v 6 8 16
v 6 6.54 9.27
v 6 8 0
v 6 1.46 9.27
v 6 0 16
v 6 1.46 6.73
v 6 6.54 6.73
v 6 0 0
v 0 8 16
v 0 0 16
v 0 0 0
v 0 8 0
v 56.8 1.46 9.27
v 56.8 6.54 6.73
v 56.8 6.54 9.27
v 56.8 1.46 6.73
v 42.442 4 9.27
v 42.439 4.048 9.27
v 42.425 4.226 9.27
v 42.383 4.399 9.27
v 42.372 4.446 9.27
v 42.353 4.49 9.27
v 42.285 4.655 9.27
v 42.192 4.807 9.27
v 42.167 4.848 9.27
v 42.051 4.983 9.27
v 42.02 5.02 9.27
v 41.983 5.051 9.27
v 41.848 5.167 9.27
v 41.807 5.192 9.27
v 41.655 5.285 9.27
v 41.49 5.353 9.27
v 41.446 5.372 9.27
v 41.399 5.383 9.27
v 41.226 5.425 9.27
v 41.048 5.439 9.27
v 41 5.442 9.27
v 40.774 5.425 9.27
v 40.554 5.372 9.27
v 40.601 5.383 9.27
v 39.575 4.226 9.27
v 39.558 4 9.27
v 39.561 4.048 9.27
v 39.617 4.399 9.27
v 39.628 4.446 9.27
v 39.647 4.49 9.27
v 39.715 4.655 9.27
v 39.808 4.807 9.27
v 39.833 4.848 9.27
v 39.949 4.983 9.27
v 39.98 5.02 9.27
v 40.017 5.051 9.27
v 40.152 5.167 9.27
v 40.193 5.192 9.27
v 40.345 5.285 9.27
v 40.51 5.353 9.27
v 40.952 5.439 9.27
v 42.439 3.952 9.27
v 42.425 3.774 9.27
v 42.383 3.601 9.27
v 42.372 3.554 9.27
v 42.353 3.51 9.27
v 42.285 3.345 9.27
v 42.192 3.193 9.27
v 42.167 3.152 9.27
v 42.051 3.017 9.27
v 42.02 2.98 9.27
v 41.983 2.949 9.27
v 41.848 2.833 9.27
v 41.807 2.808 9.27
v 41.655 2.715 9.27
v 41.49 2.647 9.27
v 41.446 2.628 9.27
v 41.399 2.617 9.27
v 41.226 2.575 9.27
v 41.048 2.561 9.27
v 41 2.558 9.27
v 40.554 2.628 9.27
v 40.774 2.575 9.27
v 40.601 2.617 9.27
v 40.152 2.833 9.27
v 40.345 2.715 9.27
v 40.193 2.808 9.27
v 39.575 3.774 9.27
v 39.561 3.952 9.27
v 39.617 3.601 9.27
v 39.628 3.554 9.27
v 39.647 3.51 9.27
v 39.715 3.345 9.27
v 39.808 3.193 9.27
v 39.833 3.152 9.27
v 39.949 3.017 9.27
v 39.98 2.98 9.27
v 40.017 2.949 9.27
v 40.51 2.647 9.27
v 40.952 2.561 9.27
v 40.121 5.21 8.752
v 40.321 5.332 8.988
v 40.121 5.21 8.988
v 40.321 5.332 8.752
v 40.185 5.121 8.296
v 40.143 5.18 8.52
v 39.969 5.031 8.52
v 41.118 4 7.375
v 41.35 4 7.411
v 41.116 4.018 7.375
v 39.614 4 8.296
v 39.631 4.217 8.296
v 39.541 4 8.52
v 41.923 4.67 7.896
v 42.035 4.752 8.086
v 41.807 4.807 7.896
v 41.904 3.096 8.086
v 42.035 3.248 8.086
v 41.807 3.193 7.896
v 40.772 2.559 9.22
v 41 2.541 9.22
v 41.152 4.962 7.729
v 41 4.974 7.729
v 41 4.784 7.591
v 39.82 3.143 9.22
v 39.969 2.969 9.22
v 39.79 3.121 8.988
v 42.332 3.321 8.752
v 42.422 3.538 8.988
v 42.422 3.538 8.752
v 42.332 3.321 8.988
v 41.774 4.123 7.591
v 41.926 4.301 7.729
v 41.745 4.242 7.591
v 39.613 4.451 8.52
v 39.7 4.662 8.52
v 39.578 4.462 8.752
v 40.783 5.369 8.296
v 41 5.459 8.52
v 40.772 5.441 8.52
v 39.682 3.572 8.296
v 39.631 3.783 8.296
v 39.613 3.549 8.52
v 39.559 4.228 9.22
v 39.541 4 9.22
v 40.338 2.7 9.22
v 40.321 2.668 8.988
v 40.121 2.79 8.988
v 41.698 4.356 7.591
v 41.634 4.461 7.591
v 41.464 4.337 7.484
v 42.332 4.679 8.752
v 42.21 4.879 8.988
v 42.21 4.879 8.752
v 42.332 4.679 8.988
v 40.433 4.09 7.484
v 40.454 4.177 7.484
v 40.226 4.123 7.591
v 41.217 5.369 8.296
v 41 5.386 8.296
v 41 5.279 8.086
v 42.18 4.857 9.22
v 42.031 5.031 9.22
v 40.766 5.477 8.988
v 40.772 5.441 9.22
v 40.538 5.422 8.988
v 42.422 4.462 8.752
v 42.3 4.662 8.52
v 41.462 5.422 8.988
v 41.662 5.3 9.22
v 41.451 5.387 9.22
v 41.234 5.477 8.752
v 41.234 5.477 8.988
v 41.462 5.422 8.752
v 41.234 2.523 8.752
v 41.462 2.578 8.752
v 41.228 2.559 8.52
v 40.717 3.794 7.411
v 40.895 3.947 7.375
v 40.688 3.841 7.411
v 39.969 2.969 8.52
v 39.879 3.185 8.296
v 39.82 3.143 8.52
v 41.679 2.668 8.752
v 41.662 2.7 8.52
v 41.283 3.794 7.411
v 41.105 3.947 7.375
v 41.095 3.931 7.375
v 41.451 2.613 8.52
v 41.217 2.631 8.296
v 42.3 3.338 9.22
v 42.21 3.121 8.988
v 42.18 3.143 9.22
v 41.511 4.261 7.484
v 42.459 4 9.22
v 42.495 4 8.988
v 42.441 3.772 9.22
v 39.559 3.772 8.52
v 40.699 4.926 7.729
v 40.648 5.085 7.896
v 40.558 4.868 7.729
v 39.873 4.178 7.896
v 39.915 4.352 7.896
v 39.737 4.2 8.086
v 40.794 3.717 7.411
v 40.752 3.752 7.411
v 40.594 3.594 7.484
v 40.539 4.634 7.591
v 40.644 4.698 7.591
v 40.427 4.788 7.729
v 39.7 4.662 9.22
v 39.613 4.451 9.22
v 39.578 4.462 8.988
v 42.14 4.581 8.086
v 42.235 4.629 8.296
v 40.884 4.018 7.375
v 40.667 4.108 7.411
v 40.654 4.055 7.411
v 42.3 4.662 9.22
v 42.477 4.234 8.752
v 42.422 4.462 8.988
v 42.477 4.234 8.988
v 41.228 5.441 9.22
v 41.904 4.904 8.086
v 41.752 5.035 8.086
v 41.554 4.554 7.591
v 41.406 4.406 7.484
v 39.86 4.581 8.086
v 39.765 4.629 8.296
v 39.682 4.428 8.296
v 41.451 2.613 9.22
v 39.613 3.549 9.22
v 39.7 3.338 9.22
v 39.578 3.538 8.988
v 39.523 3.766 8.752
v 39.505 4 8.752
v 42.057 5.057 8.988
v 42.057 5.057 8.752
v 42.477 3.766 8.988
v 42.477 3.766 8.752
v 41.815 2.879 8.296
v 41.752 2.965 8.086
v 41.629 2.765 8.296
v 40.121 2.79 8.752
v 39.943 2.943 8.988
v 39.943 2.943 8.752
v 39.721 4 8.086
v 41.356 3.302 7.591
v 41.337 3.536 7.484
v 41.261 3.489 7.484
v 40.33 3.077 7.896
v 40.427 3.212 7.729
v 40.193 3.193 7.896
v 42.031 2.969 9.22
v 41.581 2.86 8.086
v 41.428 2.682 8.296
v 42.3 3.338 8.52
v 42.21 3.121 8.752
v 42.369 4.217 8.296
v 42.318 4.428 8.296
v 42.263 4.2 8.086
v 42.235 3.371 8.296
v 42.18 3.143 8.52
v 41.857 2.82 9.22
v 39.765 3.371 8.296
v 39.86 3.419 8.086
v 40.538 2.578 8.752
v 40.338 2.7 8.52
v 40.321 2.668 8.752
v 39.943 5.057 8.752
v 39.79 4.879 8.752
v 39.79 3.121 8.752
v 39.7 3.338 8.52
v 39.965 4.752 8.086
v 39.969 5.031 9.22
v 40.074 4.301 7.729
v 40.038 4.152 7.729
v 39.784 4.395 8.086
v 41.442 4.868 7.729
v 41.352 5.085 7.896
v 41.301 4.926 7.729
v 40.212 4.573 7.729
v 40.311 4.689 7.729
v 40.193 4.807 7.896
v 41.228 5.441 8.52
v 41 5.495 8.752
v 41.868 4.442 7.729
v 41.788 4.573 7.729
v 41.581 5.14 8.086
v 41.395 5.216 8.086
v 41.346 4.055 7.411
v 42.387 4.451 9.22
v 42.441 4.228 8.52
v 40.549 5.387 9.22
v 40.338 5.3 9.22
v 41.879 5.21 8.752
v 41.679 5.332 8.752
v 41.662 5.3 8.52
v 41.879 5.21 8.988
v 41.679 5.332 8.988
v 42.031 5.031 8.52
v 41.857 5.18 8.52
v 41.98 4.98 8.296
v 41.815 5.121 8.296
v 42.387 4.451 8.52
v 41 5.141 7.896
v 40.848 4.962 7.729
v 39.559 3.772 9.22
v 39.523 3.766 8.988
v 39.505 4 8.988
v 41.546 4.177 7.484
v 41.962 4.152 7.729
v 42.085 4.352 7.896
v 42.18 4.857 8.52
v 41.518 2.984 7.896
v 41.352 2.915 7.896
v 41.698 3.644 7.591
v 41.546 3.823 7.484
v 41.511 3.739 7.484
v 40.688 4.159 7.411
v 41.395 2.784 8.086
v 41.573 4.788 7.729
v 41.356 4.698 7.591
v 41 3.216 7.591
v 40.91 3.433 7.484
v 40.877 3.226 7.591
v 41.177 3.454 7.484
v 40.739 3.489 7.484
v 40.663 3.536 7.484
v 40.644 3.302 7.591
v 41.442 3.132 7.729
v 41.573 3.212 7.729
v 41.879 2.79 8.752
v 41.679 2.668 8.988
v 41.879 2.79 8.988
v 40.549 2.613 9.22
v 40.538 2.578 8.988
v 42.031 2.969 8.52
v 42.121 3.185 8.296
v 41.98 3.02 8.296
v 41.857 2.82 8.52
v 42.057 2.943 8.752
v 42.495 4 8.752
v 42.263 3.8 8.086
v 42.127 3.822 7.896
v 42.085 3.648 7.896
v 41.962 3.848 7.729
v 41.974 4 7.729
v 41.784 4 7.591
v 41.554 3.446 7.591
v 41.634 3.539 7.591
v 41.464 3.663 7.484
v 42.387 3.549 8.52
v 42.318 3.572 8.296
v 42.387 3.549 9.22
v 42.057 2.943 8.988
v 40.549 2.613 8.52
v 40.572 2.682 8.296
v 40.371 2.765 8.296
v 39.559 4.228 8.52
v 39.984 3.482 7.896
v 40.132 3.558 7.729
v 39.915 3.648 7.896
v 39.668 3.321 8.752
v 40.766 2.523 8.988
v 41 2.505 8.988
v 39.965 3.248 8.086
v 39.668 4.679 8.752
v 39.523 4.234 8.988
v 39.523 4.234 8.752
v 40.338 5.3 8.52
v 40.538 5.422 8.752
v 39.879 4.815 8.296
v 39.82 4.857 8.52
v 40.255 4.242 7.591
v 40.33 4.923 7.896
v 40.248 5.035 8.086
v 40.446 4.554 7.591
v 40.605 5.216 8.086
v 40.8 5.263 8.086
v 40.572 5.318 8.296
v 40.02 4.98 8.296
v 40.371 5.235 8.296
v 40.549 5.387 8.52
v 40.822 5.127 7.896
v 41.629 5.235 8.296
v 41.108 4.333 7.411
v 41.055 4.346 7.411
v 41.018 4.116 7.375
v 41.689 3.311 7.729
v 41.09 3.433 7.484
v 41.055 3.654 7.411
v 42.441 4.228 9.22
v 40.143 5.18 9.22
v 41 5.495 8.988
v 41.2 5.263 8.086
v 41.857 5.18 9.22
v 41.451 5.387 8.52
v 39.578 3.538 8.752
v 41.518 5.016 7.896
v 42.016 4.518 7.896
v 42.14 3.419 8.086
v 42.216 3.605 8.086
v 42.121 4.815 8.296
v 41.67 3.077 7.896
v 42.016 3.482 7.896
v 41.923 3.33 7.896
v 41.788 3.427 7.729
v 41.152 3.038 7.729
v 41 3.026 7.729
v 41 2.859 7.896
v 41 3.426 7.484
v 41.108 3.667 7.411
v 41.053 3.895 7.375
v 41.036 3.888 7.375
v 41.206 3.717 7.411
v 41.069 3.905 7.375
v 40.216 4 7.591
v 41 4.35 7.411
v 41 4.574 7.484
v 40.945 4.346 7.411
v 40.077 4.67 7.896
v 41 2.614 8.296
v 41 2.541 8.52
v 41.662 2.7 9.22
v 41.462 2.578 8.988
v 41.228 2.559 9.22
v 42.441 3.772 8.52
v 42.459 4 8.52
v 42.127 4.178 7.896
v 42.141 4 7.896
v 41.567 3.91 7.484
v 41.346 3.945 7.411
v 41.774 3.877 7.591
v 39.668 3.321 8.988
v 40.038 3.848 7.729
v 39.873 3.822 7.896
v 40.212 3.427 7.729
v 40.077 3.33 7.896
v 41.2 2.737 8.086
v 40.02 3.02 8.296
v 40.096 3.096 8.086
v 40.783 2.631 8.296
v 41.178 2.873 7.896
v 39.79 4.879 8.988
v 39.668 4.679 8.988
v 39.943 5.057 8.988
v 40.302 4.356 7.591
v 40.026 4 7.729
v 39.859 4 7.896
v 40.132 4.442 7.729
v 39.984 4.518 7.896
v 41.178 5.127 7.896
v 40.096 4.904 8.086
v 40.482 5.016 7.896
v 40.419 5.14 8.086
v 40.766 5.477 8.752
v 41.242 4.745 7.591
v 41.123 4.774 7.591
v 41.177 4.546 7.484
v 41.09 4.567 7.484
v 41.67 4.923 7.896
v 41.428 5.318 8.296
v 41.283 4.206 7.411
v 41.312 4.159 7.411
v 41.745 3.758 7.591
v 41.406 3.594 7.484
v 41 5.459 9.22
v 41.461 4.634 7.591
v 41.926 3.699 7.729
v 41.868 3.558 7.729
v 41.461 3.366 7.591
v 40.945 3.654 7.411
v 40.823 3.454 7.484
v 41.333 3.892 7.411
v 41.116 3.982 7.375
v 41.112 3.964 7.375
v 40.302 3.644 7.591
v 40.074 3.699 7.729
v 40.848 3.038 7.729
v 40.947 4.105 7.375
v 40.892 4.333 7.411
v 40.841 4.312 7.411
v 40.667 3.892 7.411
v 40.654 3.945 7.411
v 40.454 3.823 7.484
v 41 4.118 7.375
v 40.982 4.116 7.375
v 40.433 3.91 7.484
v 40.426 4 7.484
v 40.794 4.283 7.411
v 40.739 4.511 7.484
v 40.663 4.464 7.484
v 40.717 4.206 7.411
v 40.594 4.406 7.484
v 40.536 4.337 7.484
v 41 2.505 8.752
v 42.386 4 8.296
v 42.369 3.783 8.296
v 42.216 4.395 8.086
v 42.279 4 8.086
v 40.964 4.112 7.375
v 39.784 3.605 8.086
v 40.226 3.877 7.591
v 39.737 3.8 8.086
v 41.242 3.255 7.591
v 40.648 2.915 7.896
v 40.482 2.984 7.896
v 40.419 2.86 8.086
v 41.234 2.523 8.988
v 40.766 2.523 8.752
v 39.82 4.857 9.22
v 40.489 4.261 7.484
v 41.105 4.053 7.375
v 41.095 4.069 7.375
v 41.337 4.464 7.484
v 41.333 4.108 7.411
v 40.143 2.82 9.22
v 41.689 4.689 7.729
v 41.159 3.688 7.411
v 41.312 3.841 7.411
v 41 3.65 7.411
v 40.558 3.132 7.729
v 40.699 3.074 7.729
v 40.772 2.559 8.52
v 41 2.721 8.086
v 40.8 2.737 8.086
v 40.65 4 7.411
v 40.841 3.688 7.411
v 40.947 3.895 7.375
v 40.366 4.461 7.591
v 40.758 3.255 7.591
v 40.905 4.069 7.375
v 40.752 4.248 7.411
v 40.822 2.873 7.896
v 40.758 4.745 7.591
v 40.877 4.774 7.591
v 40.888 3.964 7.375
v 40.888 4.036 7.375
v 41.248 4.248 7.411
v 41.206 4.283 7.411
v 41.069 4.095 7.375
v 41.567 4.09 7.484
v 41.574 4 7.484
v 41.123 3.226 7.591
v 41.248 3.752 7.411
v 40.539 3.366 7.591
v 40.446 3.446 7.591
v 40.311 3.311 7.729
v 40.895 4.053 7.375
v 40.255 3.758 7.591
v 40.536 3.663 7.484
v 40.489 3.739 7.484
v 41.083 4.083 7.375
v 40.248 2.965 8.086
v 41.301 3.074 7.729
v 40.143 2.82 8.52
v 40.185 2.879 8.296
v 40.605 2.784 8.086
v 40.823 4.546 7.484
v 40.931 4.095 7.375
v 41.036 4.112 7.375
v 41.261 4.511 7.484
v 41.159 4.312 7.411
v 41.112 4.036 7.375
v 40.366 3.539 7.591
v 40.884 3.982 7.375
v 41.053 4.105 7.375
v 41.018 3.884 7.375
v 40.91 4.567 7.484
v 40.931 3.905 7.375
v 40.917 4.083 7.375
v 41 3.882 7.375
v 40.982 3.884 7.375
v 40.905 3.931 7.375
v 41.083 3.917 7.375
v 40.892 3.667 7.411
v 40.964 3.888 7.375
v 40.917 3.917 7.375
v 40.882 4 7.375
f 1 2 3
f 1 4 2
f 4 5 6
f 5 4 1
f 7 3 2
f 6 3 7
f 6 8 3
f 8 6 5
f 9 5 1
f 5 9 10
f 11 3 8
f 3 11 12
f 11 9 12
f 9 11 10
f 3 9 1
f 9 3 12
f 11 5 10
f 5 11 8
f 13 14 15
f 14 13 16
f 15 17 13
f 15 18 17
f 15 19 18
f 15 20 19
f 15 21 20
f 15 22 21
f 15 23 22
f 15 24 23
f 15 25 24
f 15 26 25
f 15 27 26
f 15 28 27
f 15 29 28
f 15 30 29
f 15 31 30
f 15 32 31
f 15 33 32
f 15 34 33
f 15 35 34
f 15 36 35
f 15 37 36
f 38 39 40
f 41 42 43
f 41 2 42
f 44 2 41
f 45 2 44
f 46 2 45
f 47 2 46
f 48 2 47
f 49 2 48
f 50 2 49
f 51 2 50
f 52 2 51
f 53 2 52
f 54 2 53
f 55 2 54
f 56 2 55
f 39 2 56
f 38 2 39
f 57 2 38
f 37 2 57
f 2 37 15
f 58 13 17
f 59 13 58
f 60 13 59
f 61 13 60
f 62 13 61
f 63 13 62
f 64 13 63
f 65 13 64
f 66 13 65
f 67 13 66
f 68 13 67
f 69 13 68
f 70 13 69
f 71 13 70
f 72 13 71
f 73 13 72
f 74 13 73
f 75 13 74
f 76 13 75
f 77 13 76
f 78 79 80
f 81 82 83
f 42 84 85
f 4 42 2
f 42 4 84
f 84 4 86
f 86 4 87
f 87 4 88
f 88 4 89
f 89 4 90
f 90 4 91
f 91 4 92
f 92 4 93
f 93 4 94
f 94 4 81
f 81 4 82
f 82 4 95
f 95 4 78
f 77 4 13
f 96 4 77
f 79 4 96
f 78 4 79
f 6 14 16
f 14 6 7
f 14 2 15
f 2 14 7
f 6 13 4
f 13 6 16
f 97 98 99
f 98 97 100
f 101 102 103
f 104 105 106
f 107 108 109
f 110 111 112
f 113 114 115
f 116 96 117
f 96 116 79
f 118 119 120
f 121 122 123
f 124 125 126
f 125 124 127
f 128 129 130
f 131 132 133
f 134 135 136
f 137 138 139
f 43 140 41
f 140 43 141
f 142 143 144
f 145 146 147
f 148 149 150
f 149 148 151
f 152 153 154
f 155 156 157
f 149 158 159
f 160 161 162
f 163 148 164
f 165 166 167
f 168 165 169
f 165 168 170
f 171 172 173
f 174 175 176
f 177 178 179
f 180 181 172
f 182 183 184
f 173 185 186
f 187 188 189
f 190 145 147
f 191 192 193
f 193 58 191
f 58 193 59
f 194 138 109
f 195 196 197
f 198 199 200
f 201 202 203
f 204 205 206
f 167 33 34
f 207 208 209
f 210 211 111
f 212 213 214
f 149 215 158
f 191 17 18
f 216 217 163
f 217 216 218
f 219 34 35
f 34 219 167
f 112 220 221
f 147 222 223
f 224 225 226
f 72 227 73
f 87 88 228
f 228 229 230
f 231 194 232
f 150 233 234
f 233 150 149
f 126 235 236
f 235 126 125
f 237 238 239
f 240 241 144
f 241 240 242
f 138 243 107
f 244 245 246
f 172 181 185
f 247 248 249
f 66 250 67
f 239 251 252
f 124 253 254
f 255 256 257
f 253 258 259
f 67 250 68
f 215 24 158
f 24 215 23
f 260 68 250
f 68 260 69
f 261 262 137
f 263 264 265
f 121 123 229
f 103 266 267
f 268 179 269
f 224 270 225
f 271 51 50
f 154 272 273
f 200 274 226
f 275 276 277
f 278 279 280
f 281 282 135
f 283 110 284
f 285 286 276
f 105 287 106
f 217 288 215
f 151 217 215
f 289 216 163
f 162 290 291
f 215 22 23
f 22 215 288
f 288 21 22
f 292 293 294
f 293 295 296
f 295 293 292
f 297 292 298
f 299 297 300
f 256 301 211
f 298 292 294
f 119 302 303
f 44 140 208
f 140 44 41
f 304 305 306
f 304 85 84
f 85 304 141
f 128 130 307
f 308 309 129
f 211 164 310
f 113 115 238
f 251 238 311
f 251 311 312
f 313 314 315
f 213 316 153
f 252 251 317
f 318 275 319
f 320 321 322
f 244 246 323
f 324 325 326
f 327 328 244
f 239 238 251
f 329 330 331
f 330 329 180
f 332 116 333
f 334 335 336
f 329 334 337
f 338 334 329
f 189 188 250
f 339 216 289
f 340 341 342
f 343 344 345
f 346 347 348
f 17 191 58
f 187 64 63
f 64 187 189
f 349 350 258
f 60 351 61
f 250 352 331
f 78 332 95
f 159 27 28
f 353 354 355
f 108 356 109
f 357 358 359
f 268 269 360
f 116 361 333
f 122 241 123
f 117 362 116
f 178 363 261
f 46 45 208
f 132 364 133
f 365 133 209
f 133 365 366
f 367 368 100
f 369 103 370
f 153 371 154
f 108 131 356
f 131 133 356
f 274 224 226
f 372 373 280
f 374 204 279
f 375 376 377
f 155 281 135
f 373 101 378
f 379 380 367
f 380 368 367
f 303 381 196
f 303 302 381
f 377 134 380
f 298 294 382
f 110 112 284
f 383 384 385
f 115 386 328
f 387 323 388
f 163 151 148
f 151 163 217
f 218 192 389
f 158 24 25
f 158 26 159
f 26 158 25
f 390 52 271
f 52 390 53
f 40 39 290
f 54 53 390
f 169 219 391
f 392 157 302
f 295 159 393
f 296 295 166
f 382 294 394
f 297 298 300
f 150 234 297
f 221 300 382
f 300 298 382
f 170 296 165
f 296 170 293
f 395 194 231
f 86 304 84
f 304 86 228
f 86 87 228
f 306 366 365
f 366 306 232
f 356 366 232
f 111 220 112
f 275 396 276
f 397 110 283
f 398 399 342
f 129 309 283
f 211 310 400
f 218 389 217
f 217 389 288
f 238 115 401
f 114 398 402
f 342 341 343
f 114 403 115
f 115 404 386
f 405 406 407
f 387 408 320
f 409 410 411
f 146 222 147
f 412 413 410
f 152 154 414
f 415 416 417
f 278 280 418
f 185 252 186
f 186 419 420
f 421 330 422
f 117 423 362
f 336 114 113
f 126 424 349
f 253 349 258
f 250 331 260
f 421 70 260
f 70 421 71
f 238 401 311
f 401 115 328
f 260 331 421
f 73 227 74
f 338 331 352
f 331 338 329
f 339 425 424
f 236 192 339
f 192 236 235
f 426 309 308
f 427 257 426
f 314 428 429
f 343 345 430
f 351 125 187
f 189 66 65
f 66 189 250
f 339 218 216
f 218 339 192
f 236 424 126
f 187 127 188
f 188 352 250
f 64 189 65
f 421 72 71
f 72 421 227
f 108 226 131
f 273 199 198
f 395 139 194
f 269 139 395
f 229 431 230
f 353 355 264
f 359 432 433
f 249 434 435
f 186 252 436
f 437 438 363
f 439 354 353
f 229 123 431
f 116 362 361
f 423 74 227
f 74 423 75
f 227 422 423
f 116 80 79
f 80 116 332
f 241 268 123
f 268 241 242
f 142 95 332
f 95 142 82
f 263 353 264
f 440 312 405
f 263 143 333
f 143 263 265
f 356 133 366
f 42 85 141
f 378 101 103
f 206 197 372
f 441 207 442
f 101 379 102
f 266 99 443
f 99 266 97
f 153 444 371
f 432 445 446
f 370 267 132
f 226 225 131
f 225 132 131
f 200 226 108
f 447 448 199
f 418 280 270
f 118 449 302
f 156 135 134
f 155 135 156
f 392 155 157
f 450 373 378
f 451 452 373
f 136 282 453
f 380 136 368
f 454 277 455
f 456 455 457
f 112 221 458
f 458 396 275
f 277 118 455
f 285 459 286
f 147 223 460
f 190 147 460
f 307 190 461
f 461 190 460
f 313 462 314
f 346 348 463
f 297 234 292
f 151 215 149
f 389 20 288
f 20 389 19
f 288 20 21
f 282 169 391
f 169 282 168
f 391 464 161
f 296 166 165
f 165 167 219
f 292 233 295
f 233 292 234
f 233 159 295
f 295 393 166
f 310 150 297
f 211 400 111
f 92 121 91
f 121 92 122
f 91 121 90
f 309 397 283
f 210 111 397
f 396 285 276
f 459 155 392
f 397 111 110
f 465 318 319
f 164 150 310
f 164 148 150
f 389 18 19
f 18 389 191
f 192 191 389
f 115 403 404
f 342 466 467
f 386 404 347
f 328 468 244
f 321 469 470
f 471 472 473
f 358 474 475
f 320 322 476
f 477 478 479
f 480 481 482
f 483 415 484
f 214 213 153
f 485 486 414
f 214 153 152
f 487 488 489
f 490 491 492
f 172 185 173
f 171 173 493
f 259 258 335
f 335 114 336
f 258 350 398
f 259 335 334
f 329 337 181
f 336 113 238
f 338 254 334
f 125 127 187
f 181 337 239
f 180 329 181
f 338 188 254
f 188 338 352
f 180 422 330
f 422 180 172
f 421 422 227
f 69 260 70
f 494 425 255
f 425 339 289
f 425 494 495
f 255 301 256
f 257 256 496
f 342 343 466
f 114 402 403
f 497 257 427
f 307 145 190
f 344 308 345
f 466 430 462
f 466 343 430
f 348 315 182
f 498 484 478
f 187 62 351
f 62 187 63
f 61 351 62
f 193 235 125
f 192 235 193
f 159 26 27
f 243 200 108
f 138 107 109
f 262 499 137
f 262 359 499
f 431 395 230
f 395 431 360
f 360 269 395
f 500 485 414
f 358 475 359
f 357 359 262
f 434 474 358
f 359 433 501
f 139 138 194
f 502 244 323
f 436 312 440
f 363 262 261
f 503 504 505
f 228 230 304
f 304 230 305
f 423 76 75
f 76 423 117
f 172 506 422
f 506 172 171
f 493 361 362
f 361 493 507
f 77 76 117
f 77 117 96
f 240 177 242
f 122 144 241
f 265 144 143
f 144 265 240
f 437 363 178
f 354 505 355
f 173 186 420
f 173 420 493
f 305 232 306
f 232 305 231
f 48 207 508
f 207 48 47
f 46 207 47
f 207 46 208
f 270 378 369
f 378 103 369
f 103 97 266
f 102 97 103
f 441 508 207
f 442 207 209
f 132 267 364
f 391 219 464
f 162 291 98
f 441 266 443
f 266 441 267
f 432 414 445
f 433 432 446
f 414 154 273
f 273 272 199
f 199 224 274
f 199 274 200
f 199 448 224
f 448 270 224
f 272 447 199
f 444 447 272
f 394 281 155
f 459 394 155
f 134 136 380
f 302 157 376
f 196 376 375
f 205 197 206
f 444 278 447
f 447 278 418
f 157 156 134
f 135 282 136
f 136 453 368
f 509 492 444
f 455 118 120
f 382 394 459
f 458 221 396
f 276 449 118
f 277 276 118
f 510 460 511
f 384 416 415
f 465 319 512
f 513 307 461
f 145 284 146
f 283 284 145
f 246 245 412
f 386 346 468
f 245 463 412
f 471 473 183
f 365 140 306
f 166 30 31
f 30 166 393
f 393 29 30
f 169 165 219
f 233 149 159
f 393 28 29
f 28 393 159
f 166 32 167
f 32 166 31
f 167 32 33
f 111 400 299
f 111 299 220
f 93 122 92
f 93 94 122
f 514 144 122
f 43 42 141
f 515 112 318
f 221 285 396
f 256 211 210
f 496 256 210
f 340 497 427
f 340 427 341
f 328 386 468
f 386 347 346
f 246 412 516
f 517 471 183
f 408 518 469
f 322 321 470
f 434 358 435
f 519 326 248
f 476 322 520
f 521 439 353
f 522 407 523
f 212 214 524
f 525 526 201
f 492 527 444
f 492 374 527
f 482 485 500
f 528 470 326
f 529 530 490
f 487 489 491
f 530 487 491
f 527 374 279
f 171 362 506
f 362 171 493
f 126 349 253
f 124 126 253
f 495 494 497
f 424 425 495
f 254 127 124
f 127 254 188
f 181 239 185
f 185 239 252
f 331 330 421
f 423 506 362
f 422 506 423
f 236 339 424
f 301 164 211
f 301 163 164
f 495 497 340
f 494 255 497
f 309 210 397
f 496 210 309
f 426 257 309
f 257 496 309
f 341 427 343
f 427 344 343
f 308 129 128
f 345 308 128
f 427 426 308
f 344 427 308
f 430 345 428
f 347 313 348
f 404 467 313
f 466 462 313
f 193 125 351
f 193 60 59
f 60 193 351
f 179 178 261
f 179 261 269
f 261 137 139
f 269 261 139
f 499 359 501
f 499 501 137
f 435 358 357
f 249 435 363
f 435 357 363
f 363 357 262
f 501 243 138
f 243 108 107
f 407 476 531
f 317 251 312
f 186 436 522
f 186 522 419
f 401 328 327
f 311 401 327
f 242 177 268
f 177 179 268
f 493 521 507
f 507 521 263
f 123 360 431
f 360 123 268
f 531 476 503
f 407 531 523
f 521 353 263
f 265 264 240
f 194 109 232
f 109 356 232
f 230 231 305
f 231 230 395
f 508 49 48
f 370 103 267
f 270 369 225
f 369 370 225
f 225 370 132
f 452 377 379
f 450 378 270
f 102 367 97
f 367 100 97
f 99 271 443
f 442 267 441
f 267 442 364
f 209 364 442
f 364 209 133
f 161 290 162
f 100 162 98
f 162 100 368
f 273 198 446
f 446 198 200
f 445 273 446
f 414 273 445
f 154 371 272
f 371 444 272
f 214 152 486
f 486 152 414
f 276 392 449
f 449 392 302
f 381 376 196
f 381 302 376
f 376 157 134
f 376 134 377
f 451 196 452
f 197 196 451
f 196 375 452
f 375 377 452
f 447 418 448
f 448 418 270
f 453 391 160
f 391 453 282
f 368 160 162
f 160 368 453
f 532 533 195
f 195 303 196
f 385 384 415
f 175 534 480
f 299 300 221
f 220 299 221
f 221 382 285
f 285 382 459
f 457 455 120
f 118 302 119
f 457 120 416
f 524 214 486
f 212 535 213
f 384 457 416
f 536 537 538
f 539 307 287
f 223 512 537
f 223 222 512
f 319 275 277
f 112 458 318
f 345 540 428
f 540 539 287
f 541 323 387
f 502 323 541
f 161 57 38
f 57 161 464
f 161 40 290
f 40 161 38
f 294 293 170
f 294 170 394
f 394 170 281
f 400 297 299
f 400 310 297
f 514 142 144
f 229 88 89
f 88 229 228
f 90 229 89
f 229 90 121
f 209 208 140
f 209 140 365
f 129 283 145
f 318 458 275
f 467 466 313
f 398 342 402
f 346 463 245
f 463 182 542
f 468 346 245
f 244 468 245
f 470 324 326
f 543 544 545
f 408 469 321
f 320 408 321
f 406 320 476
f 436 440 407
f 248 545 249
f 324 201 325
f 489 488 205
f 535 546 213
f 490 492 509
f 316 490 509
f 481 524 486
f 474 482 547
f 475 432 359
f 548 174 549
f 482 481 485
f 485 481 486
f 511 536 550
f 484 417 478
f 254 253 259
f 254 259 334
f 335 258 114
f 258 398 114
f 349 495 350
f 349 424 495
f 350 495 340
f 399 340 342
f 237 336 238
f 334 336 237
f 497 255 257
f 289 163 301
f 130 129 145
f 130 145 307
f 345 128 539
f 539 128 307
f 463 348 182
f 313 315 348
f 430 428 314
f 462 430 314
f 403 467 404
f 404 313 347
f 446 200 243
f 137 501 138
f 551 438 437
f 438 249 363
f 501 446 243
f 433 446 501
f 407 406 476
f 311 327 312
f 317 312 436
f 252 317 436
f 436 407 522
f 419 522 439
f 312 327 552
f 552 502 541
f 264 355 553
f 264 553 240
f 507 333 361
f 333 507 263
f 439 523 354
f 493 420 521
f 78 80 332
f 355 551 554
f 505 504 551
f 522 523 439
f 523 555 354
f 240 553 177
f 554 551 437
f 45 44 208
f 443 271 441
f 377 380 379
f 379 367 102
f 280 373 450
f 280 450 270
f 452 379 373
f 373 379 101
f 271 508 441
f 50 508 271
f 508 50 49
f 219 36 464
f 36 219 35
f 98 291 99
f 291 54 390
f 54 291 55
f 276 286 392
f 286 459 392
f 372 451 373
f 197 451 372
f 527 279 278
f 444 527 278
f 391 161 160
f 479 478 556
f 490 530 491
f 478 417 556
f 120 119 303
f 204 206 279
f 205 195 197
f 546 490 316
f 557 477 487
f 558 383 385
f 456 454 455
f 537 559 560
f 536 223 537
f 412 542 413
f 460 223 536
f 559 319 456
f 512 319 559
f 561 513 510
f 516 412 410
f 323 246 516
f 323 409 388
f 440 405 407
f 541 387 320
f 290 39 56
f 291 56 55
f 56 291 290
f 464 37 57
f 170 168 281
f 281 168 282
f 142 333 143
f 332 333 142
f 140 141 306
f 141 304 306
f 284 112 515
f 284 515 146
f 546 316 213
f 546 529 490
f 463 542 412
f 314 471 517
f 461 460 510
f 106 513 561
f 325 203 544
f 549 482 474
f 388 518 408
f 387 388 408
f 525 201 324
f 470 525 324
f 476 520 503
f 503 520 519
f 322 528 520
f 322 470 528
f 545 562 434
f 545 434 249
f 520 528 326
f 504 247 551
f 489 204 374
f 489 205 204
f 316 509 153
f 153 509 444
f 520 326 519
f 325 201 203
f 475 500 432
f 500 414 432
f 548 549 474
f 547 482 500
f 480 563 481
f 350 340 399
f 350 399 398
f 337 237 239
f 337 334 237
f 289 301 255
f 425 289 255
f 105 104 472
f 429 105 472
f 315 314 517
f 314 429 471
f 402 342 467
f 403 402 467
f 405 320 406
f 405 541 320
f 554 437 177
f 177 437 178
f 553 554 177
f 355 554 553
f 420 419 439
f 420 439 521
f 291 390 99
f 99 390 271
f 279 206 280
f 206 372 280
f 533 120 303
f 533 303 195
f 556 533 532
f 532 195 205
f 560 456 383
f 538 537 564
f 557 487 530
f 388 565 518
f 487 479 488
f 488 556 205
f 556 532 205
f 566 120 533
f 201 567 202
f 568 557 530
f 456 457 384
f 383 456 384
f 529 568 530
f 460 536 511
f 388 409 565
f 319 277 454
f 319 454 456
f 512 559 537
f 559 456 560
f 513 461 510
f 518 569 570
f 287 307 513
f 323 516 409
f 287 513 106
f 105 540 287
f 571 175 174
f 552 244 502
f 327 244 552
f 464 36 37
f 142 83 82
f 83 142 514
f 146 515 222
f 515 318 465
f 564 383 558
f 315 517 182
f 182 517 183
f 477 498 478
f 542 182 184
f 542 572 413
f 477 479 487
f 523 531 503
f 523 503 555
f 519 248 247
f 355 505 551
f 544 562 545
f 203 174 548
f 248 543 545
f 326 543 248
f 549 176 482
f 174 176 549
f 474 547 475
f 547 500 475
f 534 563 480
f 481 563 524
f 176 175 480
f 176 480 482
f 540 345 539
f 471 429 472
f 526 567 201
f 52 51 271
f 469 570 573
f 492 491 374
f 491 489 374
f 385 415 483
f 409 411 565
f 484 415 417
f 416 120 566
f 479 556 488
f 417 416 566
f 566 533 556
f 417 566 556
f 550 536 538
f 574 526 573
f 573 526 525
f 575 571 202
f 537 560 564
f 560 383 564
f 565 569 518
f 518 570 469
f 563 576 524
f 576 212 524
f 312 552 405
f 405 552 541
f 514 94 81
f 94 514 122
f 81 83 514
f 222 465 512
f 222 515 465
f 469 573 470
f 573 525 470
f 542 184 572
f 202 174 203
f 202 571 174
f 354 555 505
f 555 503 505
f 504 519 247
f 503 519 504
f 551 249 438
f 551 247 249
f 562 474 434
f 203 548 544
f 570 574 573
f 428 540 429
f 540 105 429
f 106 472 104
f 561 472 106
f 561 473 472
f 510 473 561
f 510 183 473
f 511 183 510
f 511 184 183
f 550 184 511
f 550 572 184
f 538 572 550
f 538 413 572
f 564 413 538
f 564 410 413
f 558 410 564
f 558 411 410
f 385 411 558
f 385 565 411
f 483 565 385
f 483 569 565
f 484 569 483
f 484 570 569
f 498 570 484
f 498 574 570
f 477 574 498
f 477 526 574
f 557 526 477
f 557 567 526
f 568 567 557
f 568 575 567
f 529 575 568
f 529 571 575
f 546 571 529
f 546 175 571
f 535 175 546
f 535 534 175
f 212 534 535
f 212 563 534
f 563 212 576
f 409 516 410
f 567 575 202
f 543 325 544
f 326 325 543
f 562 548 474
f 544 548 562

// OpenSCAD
// TAYLKOMB corrected main comb passive tang visual
tang_w = 5.08;
tang_h = 2.54;
tang_l = 50.8;
shoulder_t = 6;
shoulder_w = 8;
shoulder_h = 16;
difference() {
    union() {
        cube([shoulder_t, shoulder_w, shoulder_h], center=false);
        translate([shoulder_t, (shoulder_w - tang_w)/2, (shoulder_h - tang_h)/2]) cube([tang_l, tang_w, tang_h], center=false);
    }
    translate([shoulder_t + 35, shoulder_w/2, shoulder_h/2 + tang_h/2 - 0.4]) sphere(r=1.5, $fn=40);
}
